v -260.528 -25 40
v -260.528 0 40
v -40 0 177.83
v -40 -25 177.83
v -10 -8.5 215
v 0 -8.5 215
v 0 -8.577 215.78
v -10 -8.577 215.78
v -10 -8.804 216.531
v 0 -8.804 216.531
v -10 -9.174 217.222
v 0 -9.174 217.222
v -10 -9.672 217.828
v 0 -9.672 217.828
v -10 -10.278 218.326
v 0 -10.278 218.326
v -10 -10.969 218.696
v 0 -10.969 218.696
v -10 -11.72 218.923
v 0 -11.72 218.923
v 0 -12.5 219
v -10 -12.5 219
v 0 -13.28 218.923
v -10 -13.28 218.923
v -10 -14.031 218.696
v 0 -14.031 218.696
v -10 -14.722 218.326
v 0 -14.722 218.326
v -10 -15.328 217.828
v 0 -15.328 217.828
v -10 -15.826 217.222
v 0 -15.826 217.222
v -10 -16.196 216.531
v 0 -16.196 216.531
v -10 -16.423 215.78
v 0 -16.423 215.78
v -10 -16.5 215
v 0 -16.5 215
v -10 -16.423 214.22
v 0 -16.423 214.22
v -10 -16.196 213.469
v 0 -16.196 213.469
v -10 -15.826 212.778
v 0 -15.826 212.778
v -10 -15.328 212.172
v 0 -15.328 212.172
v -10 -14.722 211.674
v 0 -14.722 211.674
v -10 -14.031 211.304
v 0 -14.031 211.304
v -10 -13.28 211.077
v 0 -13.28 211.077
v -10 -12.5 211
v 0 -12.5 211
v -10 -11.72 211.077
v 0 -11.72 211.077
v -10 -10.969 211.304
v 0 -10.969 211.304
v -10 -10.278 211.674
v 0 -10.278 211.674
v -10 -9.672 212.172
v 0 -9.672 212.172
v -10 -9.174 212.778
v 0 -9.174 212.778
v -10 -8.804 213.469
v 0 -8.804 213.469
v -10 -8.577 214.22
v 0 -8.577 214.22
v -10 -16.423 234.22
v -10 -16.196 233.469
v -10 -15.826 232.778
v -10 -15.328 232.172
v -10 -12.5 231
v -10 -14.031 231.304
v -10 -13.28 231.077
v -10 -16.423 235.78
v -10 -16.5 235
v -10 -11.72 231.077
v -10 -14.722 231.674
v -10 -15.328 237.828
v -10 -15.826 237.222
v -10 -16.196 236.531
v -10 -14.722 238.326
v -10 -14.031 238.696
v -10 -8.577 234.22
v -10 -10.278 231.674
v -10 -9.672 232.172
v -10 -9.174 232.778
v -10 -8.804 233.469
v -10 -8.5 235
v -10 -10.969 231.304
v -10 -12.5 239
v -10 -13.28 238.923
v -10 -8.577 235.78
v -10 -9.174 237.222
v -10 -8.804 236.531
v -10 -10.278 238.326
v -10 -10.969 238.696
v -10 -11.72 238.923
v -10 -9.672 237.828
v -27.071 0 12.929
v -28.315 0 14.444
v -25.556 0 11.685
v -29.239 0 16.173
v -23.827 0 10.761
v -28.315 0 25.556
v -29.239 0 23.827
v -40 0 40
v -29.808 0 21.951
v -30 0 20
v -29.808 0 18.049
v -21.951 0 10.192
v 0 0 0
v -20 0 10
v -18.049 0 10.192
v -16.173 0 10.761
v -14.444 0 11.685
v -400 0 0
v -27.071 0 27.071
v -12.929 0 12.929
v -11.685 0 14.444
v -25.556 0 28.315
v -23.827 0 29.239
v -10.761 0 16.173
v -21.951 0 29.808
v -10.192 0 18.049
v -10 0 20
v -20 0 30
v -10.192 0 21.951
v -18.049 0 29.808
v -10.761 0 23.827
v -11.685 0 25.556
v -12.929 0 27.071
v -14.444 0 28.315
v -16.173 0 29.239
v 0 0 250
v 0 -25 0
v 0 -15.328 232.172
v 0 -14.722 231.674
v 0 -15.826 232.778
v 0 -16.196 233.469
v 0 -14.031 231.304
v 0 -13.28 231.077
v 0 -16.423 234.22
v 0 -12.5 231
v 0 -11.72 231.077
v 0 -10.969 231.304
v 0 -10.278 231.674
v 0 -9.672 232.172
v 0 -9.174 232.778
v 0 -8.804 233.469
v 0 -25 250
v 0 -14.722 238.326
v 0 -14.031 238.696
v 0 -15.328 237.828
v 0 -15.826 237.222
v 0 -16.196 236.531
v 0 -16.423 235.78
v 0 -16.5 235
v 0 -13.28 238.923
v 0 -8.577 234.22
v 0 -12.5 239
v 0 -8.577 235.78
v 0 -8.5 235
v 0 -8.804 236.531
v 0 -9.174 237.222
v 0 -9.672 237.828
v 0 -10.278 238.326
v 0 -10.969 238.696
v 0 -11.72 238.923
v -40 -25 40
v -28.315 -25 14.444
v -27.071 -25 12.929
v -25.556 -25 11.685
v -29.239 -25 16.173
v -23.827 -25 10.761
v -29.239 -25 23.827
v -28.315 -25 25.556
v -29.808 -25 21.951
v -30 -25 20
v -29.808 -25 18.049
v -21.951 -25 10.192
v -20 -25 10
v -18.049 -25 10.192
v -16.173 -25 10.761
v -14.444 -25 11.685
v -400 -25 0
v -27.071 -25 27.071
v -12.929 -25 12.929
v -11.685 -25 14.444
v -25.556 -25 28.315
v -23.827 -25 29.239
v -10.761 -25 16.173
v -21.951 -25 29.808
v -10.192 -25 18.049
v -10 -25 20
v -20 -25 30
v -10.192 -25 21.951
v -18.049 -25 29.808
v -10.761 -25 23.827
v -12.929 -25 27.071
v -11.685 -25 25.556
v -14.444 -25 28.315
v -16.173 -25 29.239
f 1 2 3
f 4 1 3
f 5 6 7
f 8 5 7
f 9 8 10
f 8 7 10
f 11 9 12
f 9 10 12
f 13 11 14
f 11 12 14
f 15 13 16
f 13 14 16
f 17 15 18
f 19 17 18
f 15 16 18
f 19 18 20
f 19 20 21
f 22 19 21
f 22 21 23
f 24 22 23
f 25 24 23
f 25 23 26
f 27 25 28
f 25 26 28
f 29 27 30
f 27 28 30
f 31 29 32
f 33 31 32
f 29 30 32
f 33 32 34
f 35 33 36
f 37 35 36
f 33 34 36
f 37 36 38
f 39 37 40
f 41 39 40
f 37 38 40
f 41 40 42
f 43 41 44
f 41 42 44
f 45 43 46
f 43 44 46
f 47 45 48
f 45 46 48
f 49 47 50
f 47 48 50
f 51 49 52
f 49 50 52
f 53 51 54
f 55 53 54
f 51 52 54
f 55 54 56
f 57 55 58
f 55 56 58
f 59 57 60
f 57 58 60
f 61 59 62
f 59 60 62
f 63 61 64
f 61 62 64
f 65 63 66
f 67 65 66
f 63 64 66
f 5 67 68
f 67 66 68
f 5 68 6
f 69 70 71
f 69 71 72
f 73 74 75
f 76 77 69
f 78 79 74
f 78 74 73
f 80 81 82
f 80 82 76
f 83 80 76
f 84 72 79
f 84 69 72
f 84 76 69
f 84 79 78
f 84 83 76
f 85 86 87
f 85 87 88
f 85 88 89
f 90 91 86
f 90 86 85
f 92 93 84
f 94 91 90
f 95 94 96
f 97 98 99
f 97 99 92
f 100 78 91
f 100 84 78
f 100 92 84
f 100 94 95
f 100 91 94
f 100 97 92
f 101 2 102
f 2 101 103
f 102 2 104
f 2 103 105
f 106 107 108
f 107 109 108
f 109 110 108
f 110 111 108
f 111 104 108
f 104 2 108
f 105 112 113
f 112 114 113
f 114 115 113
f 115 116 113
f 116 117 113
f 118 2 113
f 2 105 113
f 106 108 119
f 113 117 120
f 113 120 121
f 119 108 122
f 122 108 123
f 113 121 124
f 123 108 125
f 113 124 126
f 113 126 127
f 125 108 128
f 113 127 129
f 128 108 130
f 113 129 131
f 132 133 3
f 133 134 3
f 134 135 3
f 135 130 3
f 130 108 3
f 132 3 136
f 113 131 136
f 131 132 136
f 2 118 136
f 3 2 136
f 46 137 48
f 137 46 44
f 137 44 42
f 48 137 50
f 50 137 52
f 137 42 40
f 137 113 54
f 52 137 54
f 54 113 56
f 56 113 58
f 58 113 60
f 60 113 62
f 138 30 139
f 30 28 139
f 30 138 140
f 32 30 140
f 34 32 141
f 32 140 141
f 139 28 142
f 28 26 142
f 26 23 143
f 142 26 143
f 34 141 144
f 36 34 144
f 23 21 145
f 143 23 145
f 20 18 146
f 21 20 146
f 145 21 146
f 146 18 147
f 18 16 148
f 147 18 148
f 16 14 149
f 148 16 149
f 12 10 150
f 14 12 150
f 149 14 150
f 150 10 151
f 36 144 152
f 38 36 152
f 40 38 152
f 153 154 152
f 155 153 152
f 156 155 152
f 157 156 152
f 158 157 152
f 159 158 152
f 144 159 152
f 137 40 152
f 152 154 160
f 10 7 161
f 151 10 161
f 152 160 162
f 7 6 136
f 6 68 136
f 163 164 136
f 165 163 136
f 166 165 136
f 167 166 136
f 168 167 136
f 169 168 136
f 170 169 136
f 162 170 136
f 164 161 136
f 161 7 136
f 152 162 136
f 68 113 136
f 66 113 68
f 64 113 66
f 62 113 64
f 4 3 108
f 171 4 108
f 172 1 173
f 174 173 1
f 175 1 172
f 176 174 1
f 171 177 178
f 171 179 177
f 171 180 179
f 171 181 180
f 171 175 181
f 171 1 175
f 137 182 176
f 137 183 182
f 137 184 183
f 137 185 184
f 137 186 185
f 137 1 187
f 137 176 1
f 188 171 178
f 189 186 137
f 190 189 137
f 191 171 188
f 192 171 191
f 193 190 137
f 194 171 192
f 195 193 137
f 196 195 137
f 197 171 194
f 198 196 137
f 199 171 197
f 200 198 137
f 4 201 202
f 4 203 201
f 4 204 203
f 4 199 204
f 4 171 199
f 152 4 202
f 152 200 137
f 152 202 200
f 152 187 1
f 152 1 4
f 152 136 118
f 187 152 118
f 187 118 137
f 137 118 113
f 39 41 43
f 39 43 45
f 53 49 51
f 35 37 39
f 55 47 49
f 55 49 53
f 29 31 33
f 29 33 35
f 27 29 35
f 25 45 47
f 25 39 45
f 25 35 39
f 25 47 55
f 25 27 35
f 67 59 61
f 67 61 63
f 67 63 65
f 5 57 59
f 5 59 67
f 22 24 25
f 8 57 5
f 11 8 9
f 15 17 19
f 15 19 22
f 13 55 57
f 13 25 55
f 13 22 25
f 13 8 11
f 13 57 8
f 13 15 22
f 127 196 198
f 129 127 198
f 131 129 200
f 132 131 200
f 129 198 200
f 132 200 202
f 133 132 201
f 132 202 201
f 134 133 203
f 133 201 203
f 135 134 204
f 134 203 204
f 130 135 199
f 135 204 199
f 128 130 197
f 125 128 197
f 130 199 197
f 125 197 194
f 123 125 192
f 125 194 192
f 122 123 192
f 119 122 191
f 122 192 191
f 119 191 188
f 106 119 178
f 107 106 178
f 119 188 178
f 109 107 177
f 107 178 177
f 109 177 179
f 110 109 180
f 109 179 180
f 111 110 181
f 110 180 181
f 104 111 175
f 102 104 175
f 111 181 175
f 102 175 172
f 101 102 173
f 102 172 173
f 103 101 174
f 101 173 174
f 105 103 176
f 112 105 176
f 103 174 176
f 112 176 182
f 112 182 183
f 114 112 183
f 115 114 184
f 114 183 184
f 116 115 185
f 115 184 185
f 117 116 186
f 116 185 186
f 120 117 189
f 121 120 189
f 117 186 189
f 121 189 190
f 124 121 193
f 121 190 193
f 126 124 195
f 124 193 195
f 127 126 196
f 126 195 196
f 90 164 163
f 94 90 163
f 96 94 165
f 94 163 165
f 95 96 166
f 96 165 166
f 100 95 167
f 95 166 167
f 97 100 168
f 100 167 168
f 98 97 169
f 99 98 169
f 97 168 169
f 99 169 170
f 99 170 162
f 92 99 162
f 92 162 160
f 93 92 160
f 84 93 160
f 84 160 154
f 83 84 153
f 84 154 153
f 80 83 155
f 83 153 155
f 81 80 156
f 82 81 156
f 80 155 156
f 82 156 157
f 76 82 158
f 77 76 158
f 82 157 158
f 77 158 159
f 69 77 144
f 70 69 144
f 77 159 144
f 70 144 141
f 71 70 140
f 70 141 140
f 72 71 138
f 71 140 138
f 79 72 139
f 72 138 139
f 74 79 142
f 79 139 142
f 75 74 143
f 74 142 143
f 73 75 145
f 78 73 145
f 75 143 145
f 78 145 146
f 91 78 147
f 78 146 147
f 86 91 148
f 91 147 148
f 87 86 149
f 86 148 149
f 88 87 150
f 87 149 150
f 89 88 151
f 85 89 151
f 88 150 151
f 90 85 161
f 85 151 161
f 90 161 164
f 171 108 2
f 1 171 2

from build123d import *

# Parameters (mm, degrees)
F1_DEPTH = 25
F2_R     = 4
F3_DEPTH = 10
F4_R     = 10
F5_DEPTH = 25


with BuildPart() as f1:
    # F0 (on Front) → F1 (new body)
    with BuildSketch(Plane.XZ):
        Polygon((-400, 0), (0, 0), (0, 250), align=None)
        Polygon((-260.528151, 40), (-40, 177.830094), (-40, 40), align=None, mode=Mode.SUBTRACT)
    extrude(amount=F1_DEPTH)

    # F2 (on Right) → F3 (cut)
    with BuildSketch(Plane.YZ):
        with Locations((-12.5, 235)):
            Circle(F2_R)
        with Locations((-12.5, 215)):
            Circle(F2_R)
    extrude(amount=-F3_DEPTH, mode=Mode.SUBTRACT)

    # F4 (on face) → F5 (cut, through all)
    with BuildSketch(Plane.XZ.offset(25)):
        with Locations((-20, 20)):
            Circle(F4_R)
    extrude(amount=-F5_DEPTH, mode=Mode.SUBTRACT)


solid = f1.part
